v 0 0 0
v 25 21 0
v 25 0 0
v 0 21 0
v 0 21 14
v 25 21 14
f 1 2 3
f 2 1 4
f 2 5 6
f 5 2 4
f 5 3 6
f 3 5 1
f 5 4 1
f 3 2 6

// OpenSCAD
module prism(l, w, h){
       polyhedron(
               points=[[0,0,0], [l,0,0], [l,w,0], [0,w,0], [0,w,h], [l,w,h]],
               faces=[[0,1,2,3],[5,4,3,2],[0,4,5,1],[0,3,4],[5,2,1]]
               );
       
       // preview unfolded (do not include in your function
       z = 0.08;
       separation = 2;
       border = .2;
       //translate([0,w+separation,0])
       //    cube([l,w,z]);
       //translate([0,w+separation+w+border,0])
       //    cube([l,h,z]);
       //translate([0,w+separation+w+border+h+border,0])
       //    cube([l,sqrt(w*w+h*h),z]);
       //translate([l+border,w+separation+w+border+h+border,0])
       //    polyhedron(
       //            points=[[0,0,0],[h,0,0],[0,sqrt(w*w+h*h),0], [0,0,z],[h,0,z],[0,sqrt(w*w+h*h),z]],
       //            faces=[[0,1,2], [3,5,4], [0,3,4,1], [1,4,5,2], [2,5,3,0]]
       //            );
       //translate([0-border,w+separation+w+border+h+border,0])
       //    polyhedron(
       //            points=[[0,0,0],[0-h,0,0],[0,sqrt(w*w+h*h),0], [0,0,z],[0-h,0,z],[0,sqrt(w*w+h*h),z]],
       //            faces=[[1,0,2],[5,3,4],[0,1,4,3],[1,2,5,4],[2,0,3,5]]
       //            );
       }
   
   prism(25, 21, 14);
